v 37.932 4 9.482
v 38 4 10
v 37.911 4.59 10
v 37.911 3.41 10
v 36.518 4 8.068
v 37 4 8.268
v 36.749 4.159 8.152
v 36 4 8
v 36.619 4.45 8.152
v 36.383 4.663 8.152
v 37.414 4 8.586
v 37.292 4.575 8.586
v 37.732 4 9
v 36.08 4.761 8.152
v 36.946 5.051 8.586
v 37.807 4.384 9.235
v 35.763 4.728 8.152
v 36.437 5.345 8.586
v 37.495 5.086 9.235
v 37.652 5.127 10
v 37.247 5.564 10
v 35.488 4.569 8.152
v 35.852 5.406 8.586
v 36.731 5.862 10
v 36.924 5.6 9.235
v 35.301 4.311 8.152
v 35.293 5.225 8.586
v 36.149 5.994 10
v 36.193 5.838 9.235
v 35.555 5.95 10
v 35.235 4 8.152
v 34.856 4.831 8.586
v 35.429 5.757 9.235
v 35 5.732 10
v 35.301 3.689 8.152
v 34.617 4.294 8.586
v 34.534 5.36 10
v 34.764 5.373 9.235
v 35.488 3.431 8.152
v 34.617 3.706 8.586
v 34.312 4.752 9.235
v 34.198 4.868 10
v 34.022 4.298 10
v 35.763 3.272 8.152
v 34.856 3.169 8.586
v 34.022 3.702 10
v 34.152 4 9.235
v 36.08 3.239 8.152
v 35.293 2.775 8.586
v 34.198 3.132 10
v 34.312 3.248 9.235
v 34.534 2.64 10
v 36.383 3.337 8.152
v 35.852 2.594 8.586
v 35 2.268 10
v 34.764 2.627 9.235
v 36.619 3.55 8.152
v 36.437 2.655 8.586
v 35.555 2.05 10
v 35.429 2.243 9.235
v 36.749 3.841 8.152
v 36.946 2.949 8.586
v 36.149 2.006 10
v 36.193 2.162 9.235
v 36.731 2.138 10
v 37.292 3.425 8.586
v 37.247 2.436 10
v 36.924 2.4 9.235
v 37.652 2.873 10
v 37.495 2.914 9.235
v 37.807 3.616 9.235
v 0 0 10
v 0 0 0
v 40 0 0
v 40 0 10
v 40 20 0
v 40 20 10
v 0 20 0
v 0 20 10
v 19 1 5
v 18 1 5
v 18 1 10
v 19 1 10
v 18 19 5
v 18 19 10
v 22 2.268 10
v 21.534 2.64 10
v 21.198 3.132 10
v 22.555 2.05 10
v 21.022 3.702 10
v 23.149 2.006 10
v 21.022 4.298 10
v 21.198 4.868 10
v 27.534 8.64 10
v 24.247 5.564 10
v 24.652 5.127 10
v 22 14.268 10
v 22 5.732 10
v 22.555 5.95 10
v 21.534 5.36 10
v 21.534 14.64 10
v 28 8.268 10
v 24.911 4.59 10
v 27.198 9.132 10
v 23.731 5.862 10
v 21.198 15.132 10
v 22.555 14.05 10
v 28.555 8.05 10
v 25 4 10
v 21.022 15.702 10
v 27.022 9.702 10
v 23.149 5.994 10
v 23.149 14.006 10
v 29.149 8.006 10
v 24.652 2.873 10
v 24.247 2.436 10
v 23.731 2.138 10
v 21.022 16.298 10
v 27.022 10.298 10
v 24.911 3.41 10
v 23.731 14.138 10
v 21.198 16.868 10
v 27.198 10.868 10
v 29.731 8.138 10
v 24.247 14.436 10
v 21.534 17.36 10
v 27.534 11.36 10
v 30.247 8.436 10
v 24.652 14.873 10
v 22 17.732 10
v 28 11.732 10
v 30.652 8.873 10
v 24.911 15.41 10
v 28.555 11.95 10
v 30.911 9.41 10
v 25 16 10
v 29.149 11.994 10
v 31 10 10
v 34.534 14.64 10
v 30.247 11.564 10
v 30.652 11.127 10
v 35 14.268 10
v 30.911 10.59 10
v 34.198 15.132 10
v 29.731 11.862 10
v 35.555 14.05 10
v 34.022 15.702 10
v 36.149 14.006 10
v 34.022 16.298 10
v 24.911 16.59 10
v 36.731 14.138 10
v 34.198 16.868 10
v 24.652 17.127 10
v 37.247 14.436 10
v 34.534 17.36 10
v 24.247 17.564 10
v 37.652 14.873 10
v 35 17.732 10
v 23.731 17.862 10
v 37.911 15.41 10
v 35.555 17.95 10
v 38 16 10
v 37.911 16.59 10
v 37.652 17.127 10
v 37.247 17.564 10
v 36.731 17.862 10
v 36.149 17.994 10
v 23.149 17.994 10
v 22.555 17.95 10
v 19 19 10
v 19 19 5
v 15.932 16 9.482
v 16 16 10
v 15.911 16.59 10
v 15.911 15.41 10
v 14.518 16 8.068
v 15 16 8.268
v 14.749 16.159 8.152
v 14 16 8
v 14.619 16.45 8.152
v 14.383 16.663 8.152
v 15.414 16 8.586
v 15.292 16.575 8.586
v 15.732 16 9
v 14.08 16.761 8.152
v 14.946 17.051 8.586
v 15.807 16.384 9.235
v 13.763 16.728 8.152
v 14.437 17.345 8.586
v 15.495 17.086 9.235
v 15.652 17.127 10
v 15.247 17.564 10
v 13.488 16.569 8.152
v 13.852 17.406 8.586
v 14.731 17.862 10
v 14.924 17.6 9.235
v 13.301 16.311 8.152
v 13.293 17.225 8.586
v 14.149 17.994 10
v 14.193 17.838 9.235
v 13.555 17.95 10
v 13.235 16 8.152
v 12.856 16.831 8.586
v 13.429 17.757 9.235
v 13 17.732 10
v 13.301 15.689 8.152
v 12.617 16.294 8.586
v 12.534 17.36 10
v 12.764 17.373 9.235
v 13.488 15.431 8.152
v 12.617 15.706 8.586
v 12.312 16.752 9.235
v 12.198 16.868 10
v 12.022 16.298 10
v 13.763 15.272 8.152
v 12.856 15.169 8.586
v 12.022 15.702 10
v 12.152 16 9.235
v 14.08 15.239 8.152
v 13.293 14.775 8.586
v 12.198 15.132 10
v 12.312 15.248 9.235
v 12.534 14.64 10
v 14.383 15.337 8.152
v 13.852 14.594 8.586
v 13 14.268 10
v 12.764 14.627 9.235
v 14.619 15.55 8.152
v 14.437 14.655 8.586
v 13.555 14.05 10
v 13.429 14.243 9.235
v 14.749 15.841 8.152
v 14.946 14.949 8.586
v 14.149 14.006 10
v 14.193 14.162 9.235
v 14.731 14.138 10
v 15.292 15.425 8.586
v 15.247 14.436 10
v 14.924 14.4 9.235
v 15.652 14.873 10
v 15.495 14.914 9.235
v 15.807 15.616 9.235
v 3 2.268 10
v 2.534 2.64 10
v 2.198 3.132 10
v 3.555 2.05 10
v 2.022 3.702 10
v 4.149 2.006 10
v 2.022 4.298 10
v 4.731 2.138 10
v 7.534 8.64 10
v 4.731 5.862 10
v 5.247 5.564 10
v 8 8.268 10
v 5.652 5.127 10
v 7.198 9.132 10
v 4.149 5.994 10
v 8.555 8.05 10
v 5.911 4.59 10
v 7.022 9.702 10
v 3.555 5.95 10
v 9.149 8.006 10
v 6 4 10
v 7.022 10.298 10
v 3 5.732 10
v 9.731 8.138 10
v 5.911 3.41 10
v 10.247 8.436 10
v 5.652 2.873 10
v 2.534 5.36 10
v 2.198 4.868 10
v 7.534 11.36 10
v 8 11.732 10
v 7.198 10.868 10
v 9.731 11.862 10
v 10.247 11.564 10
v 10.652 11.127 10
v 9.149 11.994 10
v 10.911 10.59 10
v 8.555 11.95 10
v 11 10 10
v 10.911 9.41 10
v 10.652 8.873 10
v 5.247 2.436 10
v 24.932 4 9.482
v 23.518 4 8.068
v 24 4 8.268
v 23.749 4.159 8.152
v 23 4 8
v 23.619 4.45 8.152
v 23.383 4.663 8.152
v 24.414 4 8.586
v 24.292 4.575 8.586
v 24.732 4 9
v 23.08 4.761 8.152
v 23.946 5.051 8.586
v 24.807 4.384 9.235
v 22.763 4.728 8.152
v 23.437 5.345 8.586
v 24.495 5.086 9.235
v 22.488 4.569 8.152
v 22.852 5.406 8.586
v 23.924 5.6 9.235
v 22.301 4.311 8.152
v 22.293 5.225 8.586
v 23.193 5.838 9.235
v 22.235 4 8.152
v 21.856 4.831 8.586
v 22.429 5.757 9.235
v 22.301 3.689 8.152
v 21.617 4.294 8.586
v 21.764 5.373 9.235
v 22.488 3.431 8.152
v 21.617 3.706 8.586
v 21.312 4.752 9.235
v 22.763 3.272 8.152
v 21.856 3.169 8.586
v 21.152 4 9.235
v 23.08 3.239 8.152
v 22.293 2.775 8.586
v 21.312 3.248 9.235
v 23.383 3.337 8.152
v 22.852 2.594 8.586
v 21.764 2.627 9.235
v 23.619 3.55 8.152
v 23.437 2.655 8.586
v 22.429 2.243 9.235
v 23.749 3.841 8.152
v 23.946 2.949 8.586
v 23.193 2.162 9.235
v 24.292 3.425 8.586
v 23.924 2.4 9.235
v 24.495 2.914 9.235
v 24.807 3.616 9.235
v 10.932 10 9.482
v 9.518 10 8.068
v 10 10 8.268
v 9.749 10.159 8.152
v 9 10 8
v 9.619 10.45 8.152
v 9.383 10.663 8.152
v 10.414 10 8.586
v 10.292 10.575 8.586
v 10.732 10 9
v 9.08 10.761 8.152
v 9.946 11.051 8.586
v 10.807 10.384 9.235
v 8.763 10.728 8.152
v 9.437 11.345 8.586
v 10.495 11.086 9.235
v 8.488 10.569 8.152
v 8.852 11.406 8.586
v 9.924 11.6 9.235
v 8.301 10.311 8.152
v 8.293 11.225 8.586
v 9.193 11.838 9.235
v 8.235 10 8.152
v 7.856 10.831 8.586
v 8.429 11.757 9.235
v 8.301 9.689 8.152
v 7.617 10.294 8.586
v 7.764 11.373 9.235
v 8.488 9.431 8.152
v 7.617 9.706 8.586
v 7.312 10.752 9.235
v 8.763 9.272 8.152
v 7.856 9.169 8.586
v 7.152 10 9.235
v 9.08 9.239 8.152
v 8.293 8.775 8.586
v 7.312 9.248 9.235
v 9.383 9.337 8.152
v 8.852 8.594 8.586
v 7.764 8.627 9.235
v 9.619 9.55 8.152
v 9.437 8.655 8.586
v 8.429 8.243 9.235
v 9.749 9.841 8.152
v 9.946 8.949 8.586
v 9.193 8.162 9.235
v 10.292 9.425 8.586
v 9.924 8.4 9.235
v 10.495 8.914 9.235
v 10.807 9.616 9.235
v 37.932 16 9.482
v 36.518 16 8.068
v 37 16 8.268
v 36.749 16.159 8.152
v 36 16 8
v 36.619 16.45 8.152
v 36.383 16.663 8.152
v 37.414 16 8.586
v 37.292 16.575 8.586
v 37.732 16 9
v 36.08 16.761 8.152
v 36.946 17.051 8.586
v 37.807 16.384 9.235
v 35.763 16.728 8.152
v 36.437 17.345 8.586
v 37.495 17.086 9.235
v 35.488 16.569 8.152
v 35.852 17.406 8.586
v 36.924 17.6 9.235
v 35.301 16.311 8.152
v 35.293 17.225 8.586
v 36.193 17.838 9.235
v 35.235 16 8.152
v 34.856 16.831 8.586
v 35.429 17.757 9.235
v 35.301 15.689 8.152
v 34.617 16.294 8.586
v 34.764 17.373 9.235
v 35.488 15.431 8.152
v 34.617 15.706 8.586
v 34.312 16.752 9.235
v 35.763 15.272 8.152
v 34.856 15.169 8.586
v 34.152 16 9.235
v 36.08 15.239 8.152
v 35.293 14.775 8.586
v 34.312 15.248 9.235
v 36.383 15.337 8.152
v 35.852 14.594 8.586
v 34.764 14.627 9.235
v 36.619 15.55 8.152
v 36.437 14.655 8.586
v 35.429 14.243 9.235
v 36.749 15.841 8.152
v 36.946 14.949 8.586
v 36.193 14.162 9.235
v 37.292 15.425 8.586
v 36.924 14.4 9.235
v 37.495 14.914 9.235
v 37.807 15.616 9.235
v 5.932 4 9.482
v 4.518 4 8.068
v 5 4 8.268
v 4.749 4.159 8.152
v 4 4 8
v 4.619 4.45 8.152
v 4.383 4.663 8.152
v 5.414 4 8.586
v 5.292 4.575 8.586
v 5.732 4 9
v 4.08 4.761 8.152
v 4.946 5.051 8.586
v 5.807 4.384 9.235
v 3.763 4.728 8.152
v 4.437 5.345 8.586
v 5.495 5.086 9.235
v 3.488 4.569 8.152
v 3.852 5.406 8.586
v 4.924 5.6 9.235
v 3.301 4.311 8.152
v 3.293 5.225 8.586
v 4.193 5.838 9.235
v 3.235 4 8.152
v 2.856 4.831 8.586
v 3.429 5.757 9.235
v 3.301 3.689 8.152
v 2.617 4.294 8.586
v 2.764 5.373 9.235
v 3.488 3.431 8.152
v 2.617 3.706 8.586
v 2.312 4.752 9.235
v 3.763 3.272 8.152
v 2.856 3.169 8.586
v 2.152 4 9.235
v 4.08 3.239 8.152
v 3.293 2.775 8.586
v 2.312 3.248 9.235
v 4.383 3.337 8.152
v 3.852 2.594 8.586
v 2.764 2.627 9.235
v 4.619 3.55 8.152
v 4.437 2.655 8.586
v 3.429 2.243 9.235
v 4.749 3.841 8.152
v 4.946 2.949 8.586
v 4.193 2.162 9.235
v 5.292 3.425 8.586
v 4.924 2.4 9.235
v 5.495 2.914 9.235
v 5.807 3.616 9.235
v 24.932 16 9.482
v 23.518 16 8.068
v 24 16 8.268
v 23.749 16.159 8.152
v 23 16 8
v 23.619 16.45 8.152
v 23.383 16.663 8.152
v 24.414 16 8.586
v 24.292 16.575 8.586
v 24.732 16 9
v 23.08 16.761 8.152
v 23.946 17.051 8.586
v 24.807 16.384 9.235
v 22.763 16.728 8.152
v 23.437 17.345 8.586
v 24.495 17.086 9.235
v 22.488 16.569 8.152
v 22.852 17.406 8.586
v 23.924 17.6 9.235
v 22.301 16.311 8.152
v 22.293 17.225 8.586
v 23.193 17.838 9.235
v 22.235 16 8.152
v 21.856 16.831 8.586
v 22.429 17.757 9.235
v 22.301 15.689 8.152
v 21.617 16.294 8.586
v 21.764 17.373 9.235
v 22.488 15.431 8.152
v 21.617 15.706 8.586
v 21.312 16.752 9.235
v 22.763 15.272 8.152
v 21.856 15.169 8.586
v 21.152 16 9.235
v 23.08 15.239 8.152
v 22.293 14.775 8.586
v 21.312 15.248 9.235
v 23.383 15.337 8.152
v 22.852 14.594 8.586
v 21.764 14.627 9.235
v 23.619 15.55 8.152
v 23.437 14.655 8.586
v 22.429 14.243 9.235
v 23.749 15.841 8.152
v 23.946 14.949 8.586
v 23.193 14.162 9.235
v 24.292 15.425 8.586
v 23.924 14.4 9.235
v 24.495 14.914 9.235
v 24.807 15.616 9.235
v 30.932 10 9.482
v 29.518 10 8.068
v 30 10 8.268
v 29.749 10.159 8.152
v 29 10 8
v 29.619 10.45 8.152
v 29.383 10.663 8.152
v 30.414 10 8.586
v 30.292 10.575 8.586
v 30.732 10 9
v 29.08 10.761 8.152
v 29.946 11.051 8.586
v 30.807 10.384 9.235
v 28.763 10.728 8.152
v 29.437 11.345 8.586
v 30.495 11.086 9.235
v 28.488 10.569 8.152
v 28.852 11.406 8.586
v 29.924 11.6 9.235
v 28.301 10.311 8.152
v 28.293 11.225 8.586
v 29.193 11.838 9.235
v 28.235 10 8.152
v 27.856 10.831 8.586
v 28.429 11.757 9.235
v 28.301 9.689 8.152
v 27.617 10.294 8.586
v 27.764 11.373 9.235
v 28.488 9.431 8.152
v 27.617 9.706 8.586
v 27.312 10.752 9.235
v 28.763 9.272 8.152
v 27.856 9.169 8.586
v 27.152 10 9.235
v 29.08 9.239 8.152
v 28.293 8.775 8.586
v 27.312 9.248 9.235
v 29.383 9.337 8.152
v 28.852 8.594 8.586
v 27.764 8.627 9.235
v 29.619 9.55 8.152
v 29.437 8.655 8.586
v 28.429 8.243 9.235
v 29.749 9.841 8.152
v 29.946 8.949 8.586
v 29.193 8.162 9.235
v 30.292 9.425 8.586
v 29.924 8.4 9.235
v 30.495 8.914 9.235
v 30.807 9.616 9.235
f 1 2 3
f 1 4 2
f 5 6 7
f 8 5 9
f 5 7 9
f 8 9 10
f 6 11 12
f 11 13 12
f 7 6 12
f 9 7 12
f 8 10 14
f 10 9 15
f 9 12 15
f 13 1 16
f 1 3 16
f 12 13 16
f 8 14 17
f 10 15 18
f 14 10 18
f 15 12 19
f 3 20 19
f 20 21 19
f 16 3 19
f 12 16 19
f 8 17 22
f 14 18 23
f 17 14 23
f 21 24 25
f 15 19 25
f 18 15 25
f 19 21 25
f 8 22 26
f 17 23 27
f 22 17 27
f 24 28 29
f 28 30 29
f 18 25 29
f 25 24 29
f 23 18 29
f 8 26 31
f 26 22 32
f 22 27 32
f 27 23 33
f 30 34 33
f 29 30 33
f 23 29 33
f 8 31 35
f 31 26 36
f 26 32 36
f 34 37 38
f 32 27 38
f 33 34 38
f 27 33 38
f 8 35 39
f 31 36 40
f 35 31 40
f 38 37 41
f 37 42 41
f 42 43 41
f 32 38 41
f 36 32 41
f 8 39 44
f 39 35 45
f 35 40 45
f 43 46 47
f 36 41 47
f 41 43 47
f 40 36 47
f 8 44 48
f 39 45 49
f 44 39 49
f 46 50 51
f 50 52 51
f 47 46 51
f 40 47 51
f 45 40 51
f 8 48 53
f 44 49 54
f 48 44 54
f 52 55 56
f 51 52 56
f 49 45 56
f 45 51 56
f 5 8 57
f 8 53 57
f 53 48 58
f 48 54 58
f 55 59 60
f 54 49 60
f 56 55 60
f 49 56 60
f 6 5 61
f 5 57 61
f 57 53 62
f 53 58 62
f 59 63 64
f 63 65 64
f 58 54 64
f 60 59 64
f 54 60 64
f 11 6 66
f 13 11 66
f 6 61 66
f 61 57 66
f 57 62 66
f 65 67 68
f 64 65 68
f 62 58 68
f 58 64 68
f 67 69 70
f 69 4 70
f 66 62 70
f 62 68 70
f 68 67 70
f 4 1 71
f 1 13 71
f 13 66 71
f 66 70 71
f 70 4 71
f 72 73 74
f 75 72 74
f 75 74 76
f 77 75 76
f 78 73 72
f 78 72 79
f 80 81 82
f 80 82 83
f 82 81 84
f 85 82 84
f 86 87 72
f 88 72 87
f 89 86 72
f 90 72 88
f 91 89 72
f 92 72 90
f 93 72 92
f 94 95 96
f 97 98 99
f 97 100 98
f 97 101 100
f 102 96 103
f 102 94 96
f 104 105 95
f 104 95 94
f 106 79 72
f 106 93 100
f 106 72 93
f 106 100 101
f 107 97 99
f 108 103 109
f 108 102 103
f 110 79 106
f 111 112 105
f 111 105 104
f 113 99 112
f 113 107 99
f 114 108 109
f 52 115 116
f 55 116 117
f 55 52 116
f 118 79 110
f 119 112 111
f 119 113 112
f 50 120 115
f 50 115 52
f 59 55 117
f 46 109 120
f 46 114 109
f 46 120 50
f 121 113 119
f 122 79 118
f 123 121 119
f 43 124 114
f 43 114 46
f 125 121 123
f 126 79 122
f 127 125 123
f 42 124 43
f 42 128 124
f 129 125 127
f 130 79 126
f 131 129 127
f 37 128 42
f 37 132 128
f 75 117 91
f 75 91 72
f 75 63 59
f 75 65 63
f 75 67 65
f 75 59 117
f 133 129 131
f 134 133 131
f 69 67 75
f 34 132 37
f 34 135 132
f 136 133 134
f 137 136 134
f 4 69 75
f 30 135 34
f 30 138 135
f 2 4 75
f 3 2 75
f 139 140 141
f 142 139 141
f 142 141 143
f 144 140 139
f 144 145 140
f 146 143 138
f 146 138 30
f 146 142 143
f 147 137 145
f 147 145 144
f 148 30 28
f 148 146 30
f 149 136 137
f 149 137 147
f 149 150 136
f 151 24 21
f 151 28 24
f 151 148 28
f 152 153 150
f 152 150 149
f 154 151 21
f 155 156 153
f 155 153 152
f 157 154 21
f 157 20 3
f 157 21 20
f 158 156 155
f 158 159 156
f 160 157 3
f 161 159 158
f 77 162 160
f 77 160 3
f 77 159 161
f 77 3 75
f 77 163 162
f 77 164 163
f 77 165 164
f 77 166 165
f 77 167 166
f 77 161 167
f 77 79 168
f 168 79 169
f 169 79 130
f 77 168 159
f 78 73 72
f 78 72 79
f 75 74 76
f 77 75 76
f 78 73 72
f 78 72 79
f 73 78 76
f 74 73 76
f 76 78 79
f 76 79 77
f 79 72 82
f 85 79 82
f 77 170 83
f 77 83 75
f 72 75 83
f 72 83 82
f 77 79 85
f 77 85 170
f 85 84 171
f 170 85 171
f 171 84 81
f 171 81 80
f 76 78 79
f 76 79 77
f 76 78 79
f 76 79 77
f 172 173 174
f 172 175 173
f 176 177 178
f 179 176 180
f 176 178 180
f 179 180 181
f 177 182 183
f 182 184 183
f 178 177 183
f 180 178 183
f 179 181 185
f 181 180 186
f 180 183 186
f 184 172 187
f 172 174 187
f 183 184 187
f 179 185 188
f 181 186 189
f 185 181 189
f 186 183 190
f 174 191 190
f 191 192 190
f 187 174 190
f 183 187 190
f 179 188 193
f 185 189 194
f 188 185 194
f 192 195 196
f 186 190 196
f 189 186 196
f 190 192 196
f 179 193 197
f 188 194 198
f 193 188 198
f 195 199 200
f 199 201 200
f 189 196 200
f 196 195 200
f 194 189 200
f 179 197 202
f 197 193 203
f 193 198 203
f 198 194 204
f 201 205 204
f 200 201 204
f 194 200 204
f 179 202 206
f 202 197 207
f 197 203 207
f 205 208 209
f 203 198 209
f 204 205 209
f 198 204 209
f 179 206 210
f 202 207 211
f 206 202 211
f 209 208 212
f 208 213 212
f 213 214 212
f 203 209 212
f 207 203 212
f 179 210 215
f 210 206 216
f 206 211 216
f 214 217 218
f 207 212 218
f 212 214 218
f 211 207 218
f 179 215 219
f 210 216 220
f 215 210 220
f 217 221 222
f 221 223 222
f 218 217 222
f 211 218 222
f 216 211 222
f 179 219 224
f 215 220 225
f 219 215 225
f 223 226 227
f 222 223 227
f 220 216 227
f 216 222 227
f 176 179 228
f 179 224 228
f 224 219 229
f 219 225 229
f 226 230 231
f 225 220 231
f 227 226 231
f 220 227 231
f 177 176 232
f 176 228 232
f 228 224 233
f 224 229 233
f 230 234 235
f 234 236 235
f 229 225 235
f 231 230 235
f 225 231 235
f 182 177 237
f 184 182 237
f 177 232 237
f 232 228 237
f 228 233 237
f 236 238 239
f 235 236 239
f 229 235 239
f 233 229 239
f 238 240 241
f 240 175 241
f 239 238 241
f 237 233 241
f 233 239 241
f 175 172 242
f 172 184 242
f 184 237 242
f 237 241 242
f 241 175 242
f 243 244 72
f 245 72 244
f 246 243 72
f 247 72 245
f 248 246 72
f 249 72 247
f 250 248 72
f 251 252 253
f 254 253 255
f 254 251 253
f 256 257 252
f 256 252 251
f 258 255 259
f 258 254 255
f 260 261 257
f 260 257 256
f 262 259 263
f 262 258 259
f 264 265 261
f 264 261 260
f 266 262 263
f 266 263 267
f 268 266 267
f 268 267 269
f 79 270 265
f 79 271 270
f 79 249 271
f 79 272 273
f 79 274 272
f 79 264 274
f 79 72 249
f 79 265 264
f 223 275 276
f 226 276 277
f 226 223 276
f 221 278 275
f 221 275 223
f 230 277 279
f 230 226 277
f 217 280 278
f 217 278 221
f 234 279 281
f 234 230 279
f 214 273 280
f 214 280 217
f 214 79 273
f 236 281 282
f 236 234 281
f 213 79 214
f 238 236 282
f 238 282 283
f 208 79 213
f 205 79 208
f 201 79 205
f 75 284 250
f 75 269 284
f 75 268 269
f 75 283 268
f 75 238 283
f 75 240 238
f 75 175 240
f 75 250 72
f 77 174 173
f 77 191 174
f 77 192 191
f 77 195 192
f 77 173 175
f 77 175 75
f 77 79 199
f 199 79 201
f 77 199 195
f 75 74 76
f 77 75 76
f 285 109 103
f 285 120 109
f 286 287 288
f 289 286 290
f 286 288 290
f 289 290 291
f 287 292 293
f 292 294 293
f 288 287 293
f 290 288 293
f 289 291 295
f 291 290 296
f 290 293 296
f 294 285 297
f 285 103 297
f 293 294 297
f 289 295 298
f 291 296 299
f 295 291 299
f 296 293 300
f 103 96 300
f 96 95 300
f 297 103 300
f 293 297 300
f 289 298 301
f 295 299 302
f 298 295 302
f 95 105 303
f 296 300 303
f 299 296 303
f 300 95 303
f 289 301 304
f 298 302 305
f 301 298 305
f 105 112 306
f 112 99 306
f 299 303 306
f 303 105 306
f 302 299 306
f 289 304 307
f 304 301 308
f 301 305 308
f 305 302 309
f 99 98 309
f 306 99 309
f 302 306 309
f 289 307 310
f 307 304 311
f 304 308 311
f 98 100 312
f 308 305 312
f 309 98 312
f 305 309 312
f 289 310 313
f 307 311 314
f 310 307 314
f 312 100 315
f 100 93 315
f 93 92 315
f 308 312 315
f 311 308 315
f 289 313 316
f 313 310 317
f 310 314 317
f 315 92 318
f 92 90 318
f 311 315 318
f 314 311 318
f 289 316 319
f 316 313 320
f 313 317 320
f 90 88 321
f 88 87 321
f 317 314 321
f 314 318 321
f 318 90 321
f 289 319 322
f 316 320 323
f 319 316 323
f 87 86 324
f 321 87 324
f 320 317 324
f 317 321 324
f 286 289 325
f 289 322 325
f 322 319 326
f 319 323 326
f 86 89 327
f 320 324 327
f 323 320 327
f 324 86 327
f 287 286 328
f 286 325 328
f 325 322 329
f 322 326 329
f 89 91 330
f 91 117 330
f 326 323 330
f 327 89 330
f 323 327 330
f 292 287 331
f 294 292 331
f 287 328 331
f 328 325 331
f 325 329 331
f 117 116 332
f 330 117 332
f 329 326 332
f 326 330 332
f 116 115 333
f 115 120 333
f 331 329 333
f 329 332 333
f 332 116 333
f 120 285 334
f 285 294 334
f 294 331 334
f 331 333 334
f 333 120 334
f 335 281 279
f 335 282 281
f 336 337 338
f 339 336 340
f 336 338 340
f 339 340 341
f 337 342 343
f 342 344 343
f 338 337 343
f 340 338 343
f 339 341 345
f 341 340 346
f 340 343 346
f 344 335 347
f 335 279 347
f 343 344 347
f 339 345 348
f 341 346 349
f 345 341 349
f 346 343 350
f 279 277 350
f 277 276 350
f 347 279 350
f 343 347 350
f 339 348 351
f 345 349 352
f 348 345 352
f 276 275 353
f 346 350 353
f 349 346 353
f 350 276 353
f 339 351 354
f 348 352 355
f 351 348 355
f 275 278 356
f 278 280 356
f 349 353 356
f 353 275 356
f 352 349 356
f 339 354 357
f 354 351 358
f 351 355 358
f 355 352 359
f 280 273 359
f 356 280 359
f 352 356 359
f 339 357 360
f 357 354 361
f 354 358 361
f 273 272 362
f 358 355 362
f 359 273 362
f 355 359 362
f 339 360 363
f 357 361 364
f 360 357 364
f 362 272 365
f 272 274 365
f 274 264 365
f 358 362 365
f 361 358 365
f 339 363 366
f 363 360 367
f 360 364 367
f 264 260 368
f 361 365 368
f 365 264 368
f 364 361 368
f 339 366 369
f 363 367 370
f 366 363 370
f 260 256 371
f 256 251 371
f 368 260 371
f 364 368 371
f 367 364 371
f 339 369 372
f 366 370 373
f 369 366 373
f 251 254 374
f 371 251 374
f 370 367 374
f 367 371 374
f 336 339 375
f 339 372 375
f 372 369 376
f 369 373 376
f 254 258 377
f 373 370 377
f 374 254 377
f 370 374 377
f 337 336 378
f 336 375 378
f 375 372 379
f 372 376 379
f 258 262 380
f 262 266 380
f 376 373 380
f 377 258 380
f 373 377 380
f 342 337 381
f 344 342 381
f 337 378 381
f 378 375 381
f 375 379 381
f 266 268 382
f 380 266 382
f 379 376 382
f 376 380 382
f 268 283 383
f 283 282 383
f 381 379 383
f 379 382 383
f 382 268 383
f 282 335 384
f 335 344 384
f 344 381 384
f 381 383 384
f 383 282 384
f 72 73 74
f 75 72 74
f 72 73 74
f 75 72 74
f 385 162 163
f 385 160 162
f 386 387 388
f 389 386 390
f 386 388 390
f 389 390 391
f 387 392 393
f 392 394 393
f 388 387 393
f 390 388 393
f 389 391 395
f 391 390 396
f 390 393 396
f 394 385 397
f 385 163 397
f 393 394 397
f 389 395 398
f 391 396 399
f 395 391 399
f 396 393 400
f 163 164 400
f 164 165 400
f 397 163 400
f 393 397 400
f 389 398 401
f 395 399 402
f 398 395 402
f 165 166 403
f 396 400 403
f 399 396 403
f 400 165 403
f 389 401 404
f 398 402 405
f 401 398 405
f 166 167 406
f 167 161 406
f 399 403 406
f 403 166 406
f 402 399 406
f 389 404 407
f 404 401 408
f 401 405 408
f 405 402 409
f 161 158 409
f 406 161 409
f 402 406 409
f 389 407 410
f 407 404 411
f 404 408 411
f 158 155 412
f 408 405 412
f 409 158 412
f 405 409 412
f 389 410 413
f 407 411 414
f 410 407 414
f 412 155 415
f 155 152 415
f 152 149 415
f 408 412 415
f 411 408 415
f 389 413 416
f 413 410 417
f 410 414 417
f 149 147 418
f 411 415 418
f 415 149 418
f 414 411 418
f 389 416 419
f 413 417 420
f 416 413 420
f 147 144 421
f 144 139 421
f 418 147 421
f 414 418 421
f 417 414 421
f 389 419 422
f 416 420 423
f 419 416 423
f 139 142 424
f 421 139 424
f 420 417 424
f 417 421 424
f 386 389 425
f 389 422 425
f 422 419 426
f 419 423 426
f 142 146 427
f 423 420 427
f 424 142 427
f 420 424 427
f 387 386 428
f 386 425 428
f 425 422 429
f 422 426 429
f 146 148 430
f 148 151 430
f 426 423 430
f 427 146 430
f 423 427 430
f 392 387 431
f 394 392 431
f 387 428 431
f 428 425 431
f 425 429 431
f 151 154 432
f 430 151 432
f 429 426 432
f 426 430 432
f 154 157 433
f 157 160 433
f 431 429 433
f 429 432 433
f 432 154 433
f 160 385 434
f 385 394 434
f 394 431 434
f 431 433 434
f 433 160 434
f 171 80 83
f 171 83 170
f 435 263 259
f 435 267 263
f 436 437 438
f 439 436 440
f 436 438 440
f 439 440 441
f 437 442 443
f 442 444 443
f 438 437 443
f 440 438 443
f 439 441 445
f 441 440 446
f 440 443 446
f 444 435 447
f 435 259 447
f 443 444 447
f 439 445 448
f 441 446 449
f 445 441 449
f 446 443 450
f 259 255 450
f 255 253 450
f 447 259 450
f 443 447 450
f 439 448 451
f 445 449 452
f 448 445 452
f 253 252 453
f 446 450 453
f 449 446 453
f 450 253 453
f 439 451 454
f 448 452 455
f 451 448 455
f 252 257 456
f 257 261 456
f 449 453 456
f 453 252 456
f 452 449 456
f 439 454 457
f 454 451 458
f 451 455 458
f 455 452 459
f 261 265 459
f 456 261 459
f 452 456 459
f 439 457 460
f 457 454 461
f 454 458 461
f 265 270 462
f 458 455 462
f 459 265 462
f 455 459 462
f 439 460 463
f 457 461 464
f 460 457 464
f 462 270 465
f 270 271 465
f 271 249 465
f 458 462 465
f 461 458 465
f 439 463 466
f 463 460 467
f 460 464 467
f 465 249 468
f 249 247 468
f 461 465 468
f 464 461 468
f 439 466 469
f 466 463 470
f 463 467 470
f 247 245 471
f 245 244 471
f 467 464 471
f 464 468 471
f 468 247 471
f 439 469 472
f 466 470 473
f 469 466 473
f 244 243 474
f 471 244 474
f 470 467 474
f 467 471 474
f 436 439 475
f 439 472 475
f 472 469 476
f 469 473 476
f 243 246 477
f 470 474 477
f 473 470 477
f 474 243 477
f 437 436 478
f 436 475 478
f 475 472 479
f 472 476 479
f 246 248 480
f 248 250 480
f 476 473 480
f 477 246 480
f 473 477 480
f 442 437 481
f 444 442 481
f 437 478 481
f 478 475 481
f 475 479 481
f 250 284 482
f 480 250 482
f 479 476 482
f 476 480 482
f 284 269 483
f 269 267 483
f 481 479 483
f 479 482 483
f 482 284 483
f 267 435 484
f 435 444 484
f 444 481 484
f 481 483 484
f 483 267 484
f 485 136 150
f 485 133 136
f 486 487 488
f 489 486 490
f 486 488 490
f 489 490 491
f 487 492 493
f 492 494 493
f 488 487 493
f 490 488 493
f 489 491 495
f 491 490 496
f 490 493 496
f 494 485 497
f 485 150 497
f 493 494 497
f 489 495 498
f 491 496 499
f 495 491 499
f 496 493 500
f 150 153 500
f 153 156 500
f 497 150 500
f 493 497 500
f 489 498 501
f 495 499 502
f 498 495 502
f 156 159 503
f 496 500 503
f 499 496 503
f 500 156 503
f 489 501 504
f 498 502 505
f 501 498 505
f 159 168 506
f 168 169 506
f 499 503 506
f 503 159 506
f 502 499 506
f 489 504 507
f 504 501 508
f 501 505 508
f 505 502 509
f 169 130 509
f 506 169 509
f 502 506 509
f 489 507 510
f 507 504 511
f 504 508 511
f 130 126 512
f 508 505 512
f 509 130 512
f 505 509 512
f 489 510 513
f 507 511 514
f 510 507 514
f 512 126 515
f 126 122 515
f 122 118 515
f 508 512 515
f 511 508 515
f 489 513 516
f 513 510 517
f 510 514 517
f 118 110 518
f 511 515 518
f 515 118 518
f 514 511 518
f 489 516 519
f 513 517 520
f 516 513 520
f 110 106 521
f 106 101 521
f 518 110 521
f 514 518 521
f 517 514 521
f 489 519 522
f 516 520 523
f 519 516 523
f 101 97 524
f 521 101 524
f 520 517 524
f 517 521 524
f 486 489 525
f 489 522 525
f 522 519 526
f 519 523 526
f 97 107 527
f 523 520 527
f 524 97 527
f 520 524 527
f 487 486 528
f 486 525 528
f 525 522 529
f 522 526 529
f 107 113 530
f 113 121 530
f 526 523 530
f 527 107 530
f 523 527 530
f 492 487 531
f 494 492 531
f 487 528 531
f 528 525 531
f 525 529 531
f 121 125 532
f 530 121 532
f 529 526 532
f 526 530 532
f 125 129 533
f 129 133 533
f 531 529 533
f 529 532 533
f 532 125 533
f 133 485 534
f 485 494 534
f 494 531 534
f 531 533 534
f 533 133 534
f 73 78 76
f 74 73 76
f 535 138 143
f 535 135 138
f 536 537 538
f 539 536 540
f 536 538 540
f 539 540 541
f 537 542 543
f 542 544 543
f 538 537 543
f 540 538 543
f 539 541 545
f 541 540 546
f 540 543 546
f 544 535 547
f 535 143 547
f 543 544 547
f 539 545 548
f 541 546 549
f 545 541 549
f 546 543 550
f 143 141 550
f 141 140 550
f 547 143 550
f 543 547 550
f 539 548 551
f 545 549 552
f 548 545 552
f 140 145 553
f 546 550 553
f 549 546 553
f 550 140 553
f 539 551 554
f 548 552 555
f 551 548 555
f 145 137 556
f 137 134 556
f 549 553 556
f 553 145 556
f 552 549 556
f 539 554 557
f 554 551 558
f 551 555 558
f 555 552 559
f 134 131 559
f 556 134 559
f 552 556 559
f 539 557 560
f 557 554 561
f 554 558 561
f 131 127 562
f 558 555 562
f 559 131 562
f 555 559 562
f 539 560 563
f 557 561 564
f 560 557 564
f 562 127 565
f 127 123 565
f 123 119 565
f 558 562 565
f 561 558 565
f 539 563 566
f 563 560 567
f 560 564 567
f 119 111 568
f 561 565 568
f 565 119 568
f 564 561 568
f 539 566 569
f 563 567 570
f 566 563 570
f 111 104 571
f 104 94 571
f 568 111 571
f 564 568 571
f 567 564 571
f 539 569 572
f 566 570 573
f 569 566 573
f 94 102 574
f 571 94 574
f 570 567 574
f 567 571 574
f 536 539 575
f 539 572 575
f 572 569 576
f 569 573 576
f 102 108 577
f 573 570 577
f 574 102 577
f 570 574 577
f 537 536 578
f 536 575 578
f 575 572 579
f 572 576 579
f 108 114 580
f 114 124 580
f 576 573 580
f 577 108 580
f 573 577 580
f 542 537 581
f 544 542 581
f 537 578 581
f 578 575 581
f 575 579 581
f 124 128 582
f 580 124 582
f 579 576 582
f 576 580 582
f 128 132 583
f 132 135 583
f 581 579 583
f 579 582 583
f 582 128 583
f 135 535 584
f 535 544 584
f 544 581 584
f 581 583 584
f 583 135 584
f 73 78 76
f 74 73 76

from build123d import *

# Parameters (mm, degrees)
BOX001_W     = 1
BOX001_H     = 18
BOX001_DEPTH = 6
BOX_W        = 40
BOX_H        = 20
BOX_DEPTH    = 10


with BuildPart() as cube001:
    # Box001 → Box001 (new body)
    with BuildSketch(Plane(origin=(18, 1, 5), x_dir=(1, 0, 0), z_dir=(0, 0, 1))):
        with Locations((0.5, 9)):
            Rectangle(BOX001_W, BOX001_H)
    extrude(amount=BOX001_DEPTH)


with BuildPart() as cube:
    # Box → Box (new body)
    with BuildSketch(Plane.XY):
        with Locations((20, 10)):
            Rectangle(BOX_W, BOX_H)
    extrude(amount=BOX_DEPTH)


with BuildPart() as cut:
    # Cut base: copy of Cube
    add(cube.part)

    # Cut: cut Cube001
    add(cube001.part, mode=Mode.SUBTRACT)


with BuildPart() as sphere004:
    # Sphere004 → Sphere004 (revolve)
    with BuildSketch(Plane(origin=(23, 4, 10), x_dir=(1, 0, 0), z_dir=(0, -1, 0))):
        with BuildLine():
            ThreePointArc((0, -2), (2, 0), (0, 2))
            Line((0, 2), (0, -2))
        make_face()
    revolve(axis=Axis((23, 4, 10), (0, 0, 1)))


with BuildPart() as sphere005:
    # Sphere005 → Sphere005 (revolve)
    with BuildSketch(Plane(origin=(36, 4, 10), x_dir=(1, 0, 0), z_dir=(0, -1, 0))):
        with BuildLine():
            ThreePointArc((0, -2), (2, 0), (0, 2))
            Line((0, 2), (0, -2))
        make_face()
    revolve(axis=Axis((36, 4, 10), (0, 0, 1)))


with BuildPart() as sphere006:
    # Sphere006 → Sphere006 (revolve)
    with BuildSketch(Plane(origin=(23, 16, 10), x_dir=(1, 0, 0), z_dir=(0, -1, 0))):
        with BuildLine():
            ThreePointArc((0, -2), (2, 0), (0, 2))
            Line((0, 2), (0, -2))
        make_face()
    revolve(axis=Axis((23, 16, 10), (0, 0, 1)))


with BuildPart() as sphere007:
    # Sphere007 → Sphere007 (revolve)
    with BuildSketch(Plane(origin=(36, 16, 10), x_dir=(1, 0, 0), z_dir=(0, -1, 0))):
        with BuildLine():
            ThreePointArc((0, -2), (2, 0), (0, 2))
            Line((0, 2), (0, -2))
        make_face()
    revolve(axis=Axis((36, 16, 10), (0, 0, 1)))


with BuildPart() as fusion001:
    # Sphere003 → Sphere003 (revolve)
    with BuildSketch(Plane(origin=(29, 10, 10), x_dir=(1, 0, 0), z_dir=(0, -1, 0))):
        with BuildLine():
            ThreePointArc((0, -2), (2, 0), (0, 2))
            Line((0, 2), (0, -2))
        make_face()
    revolve(axis=Axis((29, 10, 10), (0, 0, 1)))

    # Fusion001: union Sphere004, Sphere005, Sphere006, Sphere007
    add(sphere004.part)
    add(sphere005.part)
    add(sphere006.part)
    add(sphere007.part)


with BuildPart() as cut001:
    # Cut001 base: copy of Cube
    add(cube.part)

    # Cut001: cut Fusion001
    add(fusion001.part, mode=Mode.SUBTRACT)


with BuildPart() as sphere001:
    # Sphere001 → Sphere001 (revolve)
    with BuildSketch(Plane(origin=(9, 10, 10), x_dir=(1, 0, 0), z_dir=(0, -1, 0))):
        with BuildLine():
            ThreePointArc((0, -2), (2, 0), (0, 2))
            Line((0, 2), (0, -2))
        make_face()
    revolve(axis=Axis((9, 10, 10), (0, 0, 1)))


with BuildPart() as sphere:
    # Sphere → Sphere (revolve)
    with BuildSketch(Plane(origin=(4, 4, 10), x_dir=(1, 0, 0), z_dir=(0, -1, 0))):
        with BuildLine():
            ThreePointArc((0, -2), (2, 0), (0, 2))
            Line((0, 2), (0, -2))
        make_face()
    revolve(axis=Axis((4, 4, 10), (0, 0, 1)))


with BuildPart() as fusion:
    # Sphere002 → Sphere002 (revolve)
    with BuildSketch(Plane(origin=(14, 16, 10), x_dir=(1, 0, 0), z_dir=(0, -1, 0))):
        with BuildLine():
            ThreePointArc((0, -2), (2, 0), (0, 2))
            Line((0, 2), (0, -2))
        make_face()
    revolve(axis=Axis((14, 16, 10), (0, 0, 1)))

    # Fusion: union Sphere001, Sphere
    add(sphere001.part)
    add(sphere.part)


with BuildPart() as cut002:
    # Cut002 base: copy of Cube
    add(cube.part)

    # Cut002: cut Fusion
    add(fusion.part, mode=Mode.SUBTRACT)


solid = Compound([cut.part, cut001.part, cut002.part])
